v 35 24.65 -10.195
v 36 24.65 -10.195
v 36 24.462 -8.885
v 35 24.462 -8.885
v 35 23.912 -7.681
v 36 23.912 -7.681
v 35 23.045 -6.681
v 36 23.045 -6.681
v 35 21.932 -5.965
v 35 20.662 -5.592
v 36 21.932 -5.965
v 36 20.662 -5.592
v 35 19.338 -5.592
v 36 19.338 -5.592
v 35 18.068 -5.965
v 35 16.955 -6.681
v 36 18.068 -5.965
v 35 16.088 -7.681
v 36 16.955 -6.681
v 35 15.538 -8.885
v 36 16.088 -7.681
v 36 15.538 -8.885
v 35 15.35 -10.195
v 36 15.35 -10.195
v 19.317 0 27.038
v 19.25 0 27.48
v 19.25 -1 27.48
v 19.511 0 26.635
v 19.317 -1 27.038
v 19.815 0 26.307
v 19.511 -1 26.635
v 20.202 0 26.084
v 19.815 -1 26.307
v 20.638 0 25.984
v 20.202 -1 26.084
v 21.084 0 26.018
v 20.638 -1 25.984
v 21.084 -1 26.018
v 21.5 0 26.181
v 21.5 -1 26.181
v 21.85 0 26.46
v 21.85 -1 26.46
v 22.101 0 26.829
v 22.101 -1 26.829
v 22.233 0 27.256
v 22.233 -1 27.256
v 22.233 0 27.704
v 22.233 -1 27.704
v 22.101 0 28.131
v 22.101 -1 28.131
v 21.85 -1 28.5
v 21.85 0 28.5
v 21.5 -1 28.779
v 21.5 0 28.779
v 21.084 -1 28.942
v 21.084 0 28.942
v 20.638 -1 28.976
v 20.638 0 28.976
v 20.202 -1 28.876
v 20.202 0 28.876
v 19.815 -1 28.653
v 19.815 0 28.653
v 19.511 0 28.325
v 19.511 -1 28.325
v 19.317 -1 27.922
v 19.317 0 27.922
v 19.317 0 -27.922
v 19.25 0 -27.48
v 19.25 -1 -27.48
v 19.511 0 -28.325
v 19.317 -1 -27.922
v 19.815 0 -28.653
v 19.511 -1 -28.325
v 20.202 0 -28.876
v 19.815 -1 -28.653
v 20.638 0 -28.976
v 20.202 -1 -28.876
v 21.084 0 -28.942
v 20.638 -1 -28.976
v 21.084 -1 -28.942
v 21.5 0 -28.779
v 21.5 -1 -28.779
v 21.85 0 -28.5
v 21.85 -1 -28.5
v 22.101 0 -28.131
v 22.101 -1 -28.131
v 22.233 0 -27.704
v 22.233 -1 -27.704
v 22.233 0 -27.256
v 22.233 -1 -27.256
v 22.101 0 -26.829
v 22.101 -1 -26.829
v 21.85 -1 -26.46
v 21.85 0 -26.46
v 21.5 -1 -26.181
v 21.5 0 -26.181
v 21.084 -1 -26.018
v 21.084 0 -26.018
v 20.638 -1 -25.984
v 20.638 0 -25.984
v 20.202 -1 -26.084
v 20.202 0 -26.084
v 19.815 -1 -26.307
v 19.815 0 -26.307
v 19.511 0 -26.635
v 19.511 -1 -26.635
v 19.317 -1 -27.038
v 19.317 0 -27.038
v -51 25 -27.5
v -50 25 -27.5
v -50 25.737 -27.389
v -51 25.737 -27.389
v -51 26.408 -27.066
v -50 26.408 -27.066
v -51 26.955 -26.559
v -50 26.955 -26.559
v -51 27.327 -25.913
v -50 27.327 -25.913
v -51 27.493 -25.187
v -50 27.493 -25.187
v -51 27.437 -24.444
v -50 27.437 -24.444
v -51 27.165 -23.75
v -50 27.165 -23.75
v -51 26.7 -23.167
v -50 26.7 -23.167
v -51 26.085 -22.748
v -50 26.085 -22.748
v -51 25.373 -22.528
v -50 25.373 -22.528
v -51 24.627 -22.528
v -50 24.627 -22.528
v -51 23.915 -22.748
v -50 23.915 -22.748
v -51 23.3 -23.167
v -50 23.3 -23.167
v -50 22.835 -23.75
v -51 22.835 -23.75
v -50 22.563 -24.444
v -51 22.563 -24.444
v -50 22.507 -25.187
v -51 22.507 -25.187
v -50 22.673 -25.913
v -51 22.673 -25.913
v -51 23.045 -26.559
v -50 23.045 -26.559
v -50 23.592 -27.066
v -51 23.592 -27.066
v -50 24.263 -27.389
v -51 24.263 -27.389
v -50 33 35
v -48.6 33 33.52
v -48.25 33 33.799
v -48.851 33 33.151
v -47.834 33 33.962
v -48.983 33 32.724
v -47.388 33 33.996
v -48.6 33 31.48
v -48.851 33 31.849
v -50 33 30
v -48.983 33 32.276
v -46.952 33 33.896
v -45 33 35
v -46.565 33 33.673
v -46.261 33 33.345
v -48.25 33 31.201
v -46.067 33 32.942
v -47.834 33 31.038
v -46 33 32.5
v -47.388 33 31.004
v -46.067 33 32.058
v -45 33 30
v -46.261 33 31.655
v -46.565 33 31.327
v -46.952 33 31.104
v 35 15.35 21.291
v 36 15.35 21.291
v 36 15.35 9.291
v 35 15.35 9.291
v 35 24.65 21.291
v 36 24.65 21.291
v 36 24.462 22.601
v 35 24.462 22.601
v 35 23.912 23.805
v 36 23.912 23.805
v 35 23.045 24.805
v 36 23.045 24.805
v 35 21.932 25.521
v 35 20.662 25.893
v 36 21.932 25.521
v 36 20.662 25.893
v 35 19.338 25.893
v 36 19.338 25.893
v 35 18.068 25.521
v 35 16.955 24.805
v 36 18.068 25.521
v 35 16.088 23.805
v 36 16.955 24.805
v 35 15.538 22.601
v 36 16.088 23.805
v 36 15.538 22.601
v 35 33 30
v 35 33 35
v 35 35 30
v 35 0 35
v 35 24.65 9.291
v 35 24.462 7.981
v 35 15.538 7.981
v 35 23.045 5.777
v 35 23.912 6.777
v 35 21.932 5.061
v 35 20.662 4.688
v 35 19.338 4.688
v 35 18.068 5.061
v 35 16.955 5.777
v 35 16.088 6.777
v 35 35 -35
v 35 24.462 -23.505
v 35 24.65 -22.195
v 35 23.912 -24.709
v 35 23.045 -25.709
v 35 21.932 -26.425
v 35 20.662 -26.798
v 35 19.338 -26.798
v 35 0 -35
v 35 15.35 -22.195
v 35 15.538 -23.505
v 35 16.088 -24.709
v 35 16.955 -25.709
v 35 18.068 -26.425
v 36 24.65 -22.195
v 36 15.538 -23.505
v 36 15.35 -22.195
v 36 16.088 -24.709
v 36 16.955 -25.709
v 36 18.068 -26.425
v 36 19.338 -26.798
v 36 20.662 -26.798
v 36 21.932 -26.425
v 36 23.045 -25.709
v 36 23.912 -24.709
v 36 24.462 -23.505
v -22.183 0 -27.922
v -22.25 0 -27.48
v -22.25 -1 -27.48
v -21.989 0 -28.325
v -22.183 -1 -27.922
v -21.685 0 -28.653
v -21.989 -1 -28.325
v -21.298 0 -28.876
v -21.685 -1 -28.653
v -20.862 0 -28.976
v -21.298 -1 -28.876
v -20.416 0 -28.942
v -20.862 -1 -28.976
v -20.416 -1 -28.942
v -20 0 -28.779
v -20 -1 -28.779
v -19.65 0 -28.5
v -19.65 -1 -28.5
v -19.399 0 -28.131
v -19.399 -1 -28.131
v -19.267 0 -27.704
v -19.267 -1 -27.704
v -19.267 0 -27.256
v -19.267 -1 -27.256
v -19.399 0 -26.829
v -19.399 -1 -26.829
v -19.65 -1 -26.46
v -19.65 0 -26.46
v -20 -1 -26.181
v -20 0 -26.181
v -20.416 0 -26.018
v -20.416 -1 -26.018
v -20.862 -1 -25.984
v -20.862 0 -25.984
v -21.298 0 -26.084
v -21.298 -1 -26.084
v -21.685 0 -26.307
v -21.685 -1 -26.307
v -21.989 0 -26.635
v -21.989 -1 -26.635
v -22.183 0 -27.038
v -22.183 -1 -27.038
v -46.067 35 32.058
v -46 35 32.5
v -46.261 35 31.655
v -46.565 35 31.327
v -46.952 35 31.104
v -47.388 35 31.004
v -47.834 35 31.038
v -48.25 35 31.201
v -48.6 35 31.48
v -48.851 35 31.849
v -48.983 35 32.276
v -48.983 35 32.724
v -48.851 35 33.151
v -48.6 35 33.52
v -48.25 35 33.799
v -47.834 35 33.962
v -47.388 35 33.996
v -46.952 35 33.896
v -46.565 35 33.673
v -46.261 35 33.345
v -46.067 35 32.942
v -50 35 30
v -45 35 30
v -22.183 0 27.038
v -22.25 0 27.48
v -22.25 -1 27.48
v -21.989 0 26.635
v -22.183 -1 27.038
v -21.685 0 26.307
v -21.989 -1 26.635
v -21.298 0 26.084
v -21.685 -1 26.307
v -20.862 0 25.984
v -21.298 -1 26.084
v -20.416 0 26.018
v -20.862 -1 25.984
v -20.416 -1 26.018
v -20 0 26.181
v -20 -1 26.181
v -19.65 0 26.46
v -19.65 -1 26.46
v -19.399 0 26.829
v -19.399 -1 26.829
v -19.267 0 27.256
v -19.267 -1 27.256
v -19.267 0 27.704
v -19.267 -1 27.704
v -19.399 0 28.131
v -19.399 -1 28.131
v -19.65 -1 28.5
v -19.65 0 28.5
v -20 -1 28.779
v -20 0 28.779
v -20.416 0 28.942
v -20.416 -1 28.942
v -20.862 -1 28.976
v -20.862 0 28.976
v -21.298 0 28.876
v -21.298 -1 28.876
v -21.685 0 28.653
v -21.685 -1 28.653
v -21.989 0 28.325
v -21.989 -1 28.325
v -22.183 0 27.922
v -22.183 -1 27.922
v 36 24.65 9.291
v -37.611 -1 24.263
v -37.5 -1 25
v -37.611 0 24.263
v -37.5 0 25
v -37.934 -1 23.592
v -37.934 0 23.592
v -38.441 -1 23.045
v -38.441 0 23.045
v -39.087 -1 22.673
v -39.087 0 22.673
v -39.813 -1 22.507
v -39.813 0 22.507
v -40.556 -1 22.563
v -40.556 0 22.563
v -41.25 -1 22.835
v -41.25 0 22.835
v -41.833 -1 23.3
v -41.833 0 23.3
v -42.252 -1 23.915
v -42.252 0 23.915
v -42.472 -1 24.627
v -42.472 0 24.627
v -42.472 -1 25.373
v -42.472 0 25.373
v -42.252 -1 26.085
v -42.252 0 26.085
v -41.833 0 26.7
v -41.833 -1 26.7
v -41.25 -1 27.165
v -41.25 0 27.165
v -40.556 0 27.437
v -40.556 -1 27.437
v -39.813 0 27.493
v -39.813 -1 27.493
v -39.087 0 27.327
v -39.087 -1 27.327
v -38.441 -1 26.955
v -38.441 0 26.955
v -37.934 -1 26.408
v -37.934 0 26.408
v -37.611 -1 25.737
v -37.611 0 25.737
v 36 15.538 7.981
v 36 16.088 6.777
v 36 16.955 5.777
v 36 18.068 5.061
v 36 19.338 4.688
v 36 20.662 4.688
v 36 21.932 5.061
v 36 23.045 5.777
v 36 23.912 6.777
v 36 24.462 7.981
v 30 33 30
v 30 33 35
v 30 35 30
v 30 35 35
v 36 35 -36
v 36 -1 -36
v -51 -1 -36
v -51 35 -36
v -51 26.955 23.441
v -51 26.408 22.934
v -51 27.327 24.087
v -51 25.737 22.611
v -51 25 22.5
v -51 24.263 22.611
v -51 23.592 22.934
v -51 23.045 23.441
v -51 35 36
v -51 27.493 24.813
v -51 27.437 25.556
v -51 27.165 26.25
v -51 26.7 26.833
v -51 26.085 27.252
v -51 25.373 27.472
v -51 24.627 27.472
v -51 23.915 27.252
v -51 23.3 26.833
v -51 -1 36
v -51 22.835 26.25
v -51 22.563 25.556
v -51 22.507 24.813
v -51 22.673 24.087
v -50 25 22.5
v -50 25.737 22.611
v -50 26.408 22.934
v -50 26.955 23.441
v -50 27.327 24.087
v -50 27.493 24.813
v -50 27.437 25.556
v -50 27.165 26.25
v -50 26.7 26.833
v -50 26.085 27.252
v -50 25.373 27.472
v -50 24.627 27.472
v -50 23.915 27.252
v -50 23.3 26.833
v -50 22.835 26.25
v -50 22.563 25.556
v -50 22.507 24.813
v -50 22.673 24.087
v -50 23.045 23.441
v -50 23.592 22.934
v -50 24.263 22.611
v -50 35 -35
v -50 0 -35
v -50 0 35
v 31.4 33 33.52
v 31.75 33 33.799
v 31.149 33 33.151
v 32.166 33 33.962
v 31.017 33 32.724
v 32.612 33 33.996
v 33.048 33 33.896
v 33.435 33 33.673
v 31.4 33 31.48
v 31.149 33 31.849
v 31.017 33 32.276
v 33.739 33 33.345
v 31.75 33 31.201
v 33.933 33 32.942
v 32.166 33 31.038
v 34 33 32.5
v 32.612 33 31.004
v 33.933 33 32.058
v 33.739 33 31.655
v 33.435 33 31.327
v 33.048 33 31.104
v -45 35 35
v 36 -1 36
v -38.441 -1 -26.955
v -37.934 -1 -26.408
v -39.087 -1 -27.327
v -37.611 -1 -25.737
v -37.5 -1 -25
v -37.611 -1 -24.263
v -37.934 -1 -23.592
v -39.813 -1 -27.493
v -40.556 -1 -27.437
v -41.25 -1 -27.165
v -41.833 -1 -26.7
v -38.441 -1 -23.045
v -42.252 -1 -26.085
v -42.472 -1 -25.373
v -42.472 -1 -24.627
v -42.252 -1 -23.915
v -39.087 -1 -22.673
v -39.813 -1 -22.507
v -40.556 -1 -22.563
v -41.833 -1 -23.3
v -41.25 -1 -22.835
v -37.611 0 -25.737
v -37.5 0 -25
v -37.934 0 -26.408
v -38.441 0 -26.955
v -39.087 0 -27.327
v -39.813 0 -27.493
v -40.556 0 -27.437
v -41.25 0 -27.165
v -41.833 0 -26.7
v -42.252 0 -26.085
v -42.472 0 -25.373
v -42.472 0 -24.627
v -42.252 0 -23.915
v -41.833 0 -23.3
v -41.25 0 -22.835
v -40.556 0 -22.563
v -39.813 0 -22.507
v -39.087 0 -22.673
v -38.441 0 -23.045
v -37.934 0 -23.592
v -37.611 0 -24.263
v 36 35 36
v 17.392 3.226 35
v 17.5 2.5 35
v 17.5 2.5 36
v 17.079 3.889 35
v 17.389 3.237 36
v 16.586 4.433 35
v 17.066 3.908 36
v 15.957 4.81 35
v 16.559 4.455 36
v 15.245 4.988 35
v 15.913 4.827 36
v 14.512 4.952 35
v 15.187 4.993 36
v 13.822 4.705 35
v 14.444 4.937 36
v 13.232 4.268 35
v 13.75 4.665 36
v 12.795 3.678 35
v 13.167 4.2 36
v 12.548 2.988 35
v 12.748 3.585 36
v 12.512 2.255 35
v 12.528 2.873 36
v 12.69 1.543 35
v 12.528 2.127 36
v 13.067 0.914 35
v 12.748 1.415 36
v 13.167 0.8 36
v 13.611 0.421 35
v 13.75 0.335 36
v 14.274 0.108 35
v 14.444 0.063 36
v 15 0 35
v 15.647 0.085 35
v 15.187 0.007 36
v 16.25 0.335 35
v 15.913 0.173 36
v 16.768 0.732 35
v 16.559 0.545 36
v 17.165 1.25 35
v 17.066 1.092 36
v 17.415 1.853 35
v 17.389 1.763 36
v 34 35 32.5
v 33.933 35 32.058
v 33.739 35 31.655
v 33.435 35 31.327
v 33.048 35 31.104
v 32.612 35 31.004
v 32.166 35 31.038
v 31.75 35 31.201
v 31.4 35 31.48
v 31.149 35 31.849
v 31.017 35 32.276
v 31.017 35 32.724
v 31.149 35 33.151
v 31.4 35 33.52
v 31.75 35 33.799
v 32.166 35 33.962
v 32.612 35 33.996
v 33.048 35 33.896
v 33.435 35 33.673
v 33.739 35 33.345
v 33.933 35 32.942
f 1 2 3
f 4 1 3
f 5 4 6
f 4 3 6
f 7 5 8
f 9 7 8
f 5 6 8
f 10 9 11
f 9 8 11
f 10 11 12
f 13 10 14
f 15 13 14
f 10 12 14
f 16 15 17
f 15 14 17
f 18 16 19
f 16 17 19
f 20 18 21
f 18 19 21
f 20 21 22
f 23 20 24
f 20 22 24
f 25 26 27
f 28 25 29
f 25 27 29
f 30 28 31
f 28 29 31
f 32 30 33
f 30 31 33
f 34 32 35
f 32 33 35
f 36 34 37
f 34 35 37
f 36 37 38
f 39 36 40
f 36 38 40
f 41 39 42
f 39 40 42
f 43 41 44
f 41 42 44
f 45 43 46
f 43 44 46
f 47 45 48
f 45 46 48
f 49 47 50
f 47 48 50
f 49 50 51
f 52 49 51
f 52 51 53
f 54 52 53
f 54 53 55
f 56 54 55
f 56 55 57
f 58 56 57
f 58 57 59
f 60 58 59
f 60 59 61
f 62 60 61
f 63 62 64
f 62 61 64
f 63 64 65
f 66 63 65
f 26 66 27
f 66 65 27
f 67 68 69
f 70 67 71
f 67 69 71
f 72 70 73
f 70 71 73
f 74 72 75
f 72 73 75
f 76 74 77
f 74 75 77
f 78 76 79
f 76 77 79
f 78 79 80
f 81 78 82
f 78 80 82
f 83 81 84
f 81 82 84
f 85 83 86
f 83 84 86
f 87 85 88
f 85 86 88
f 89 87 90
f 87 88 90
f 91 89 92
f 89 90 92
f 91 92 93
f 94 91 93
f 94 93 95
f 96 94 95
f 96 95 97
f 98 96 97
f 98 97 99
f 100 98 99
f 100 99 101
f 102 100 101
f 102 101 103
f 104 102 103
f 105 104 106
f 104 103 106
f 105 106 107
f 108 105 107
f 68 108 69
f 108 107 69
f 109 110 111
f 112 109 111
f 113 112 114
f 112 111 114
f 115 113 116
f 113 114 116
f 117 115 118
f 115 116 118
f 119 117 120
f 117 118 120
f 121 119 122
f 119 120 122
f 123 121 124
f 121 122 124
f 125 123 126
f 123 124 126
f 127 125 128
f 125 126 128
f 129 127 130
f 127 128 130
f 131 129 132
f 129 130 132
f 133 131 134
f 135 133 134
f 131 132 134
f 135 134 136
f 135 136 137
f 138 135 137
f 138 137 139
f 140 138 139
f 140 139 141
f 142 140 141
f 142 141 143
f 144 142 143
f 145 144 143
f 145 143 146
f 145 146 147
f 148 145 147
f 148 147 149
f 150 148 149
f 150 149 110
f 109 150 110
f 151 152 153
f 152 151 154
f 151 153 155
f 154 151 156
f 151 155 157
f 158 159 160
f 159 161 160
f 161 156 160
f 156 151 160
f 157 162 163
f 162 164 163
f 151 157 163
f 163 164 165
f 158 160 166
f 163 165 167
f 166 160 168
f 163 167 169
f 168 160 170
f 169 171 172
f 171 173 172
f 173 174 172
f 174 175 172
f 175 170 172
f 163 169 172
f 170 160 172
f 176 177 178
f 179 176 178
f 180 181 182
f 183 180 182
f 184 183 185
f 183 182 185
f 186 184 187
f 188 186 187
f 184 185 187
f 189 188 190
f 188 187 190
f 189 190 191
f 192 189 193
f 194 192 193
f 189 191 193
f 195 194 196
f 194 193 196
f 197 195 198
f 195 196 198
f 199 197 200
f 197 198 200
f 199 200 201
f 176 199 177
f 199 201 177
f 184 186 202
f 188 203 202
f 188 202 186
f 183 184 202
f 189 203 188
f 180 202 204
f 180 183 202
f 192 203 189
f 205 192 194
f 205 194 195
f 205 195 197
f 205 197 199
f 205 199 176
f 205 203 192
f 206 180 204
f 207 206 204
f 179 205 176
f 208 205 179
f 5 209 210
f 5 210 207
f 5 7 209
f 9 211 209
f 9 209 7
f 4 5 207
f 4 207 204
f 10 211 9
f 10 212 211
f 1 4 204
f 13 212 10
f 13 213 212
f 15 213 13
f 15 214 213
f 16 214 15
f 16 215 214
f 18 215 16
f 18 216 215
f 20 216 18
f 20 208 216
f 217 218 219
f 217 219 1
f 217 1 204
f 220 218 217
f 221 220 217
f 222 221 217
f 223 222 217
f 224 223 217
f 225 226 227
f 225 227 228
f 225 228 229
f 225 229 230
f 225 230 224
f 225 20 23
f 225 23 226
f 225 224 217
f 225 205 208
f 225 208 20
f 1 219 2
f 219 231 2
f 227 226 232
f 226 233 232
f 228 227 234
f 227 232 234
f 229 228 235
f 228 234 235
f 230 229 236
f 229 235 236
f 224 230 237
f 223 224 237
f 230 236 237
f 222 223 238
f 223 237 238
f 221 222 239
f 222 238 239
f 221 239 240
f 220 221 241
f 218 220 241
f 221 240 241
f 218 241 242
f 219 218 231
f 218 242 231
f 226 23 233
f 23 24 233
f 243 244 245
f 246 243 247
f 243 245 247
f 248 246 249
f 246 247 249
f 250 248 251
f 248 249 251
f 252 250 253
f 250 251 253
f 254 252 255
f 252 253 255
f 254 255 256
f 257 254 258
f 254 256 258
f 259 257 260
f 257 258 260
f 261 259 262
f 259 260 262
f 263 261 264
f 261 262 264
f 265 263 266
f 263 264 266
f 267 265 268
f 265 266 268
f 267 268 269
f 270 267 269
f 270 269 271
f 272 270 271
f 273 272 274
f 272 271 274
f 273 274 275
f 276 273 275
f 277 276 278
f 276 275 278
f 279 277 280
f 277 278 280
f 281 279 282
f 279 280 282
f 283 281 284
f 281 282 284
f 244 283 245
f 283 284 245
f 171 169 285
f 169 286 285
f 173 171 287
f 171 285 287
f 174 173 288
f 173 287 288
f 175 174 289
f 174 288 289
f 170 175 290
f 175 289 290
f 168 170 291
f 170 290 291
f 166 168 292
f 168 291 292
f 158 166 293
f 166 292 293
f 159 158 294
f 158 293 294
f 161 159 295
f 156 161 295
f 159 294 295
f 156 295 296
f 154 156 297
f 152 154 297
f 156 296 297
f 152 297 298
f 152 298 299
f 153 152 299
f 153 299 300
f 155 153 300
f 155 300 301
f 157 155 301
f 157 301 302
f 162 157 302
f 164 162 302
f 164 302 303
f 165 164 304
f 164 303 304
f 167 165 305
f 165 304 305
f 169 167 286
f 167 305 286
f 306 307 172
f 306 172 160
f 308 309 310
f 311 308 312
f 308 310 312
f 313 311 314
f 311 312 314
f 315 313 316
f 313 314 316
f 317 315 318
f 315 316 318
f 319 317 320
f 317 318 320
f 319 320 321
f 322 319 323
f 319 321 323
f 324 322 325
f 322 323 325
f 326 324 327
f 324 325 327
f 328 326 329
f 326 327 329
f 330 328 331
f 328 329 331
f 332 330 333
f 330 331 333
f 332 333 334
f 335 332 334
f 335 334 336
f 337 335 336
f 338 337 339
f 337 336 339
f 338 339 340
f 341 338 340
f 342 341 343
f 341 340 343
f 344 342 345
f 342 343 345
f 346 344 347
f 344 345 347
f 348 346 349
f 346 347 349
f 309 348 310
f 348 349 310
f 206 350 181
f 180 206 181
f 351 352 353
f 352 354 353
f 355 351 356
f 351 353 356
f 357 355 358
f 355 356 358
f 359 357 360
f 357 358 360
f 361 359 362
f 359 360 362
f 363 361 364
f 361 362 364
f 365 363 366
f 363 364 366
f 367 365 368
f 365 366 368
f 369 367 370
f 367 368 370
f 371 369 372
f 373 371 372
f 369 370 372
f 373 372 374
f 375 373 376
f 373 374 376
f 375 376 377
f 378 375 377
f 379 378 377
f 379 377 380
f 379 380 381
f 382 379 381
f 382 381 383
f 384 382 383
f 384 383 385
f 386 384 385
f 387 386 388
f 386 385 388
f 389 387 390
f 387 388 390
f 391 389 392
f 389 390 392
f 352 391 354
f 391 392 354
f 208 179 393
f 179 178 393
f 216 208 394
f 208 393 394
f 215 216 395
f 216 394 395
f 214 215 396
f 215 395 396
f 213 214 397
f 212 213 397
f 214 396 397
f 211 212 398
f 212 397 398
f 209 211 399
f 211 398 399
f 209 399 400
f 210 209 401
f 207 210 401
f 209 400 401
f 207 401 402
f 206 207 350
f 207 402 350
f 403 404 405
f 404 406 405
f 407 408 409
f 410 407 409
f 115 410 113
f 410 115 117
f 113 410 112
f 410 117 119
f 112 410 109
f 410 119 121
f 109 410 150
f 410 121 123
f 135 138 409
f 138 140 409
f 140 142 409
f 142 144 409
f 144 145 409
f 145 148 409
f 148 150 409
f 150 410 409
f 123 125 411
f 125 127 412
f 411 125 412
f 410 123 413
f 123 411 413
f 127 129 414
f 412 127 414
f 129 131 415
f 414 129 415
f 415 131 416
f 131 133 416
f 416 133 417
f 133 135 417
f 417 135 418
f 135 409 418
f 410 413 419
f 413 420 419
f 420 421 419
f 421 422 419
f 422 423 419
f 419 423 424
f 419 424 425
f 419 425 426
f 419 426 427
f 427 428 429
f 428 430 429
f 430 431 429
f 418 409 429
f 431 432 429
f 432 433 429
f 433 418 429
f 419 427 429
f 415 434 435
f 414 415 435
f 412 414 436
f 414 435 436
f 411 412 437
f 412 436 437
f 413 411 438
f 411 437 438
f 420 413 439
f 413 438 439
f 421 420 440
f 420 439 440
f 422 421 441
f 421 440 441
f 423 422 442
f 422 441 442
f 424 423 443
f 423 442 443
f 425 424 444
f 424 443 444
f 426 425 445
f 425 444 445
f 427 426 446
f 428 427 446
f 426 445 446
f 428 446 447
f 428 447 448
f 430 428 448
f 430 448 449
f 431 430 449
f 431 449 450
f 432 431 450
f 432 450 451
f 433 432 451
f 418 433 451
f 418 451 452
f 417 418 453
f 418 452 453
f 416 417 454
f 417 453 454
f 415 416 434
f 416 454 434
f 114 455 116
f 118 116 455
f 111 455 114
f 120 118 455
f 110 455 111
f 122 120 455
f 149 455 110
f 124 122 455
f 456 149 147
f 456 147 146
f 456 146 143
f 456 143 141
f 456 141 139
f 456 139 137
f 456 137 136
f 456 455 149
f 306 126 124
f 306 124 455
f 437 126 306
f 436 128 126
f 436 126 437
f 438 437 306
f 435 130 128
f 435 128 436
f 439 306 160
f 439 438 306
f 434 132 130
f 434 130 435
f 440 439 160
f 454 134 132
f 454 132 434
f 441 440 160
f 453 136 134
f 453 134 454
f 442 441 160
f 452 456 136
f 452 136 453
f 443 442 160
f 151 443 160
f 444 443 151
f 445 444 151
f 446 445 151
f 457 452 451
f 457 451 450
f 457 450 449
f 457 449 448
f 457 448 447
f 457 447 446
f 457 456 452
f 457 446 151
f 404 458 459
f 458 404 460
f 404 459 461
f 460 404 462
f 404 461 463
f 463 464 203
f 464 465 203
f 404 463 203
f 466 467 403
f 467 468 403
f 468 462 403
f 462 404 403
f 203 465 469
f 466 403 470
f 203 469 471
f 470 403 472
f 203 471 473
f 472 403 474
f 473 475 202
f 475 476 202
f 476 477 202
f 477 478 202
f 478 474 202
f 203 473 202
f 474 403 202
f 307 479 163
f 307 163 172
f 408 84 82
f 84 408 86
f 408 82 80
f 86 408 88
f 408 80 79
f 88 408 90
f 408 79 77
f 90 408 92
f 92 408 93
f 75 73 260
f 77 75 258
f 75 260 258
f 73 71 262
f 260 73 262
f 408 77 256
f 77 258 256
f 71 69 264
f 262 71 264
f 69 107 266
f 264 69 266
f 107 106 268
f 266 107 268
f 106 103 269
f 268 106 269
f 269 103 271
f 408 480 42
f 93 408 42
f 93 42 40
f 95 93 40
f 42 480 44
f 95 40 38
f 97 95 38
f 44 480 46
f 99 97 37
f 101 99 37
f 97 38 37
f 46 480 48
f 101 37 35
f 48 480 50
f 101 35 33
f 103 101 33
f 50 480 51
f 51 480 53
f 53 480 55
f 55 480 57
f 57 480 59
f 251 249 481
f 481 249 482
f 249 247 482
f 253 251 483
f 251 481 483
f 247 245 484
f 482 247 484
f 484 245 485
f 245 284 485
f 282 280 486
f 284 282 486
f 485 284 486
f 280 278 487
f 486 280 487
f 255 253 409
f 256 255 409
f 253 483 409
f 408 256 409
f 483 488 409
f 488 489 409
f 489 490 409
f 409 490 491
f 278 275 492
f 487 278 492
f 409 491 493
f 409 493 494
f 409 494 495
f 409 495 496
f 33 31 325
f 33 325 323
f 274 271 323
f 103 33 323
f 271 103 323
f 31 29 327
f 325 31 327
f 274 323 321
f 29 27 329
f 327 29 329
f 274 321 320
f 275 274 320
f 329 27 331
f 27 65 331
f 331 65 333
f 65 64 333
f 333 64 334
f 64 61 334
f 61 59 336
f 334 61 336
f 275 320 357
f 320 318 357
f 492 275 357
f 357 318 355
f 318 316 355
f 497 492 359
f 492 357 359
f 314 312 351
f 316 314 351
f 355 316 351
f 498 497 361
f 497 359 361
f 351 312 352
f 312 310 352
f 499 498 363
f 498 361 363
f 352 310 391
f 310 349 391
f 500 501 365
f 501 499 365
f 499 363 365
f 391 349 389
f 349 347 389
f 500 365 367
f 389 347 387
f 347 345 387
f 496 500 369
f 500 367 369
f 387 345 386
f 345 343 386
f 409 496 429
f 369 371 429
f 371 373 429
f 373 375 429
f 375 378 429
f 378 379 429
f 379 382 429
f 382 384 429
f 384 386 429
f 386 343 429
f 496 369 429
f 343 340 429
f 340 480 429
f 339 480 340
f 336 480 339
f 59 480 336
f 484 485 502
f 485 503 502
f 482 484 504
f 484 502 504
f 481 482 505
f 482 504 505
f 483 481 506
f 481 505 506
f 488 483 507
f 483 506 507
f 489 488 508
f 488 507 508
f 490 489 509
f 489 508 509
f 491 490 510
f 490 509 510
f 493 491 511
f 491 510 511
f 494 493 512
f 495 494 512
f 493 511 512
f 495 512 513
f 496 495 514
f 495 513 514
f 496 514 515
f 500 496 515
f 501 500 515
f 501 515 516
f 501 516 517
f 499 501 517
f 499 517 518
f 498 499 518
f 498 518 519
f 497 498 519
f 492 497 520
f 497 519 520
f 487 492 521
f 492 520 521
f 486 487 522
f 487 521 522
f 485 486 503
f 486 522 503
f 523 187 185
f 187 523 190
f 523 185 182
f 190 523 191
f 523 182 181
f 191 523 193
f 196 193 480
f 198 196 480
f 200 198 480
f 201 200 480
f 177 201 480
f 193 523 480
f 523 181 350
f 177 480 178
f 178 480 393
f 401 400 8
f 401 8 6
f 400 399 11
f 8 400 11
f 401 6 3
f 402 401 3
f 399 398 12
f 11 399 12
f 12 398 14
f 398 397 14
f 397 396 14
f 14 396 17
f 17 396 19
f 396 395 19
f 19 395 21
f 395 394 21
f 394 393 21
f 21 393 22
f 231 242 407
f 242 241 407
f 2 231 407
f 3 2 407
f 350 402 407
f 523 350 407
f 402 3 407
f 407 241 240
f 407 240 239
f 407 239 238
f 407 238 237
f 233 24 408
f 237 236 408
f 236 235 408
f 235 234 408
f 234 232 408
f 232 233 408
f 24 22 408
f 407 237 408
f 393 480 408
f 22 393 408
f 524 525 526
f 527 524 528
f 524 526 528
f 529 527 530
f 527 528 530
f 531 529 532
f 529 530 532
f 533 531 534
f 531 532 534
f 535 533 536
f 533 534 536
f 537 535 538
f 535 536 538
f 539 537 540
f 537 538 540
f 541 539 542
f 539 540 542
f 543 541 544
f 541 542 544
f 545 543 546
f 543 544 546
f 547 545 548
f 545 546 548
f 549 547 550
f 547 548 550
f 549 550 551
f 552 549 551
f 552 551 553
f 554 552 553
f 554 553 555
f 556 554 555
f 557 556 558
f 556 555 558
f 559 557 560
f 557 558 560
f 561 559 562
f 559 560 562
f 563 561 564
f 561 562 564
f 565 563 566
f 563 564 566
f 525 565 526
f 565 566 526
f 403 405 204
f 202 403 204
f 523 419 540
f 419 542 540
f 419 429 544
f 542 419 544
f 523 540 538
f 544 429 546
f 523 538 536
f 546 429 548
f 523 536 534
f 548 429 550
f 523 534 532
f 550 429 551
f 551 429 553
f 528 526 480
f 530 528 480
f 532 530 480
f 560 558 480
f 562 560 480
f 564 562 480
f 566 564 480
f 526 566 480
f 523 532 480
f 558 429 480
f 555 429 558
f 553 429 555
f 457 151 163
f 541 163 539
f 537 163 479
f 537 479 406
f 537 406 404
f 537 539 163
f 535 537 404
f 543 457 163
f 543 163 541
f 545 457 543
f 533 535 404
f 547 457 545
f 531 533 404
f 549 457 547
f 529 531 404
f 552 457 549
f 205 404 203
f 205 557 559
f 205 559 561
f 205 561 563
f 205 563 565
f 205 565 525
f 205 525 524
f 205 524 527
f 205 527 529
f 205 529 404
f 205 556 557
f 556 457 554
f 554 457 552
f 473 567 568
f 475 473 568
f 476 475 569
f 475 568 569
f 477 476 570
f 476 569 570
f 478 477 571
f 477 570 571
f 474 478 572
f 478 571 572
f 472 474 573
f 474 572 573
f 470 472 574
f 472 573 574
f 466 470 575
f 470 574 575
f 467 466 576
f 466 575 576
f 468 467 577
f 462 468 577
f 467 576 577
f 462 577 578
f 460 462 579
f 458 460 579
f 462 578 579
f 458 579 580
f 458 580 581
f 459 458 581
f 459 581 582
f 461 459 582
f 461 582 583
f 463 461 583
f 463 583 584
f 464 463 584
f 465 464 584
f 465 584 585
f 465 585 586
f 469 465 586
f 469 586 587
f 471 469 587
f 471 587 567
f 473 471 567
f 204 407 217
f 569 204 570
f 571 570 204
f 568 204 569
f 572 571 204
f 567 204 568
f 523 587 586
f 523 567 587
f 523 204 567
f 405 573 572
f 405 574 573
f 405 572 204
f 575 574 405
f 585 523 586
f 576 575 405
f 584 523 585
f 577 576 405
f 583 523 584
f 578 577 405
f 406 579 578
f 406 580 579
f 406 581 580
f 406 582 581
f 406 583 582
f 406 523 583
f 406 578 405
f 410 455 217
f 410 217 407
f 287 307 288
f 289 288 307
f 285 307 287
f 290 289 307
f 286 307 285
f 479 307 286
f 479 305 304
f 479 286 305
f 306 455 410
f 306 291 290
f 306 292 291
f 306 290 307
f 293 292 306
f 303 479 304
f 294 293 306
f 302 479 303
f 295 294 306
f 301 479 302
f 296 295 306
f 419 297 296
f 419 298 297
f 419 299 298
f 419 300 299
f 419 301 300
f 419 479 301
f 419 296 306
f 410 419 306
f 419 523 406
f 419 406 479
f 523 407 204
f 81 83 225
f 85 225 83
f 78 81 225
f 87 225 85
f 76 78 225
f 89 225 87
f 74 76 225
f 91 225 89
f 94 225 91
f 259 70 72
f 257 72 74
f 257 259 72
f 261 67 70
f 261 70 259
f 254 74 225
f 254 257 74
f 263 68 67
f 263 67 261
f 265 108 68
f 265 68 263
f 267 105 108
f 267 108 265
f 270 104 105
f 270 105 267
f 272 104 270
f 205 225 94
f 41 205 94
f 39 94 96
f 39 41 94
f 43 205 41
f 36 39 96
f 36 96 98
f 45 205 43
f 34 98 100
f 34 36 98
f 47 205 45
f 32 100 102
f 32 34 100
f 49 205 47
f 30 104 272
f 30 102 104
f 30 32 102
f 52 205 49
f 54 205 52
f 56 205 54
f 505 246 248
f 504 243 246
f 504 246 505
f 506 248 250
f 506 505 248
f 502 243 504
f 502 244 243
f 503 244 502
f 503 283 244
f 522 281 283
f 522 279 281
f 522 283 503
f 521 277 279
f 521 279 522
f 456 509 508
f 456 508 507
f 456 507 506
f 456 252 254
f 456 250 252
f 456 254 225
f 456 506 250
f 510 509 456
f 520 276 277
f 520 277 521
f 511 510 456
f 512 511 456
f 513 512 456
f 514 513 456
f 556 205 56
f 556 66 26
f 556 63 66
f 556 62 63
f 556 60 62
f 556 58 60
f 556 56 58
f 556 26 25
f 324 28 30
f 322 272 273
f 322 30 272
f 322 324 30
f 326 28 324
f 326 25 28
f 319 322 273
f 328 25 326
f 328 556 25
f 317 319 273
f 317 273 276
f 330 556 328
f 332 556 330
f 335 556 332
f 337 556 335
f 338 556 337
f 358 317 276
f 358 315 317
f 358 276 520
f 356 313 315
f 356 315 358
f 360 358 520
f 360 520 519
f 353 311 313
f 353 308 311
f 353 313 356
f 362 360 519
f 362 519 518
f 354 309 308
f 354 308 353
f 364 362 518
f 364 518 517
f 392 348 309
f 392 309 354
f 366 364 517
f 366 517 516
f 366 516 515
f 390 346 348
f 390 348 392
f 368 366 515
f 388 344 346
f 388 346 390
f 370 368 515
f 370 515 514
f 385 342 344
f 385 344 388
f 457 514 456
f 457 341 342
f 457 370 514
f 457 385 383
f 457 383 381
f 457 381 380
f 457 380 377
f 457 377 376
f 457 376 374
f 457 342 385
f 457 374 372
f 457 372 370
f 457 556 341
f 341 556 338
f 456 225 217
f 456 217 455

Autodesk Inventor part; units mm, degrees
ref_plane "YZ Plane" through (0, 0, 0) normal (1, 0, 0) x (0, 1, 0)
ref_plane "XZ Plane" through (0, 0, 0) normal (0, 1, 0) x (-1, 0, 0)
ref_plane "XY Plane" through (0, 0, 0) normal (0, 0, 1) x (1, 0, 0)
sketch "Esboço1" plane through (0, 0, 0) normal (0, 1, 0) x (-1, 0, 0)
  line L0 (-23.75, -30.48) -> (23.75, -30.48)
  line L1 (23.75, -30.48) -> (23.75, 30.48)
  line L2 (23.75, 30.48) -> (-23.75, 30.48)
  line L3 (-23.75, 30.48) -> (-23.75, -30.48)
  line L4 (-23.75, -30.48) -> (23.75, 30.48) construction
  line L5 (23.75, -30.48) -> (-23.75, 30.48) construction
  line L6 (-35, -35) -> (35, -35)
  line L7 (35, 35) -> (-35, 35)
  line L8 (-35, 35) -> (-35, -35)
  line L9 (-35, -35) -> (35, 35) construction
  line L10 (35, -35) -> (-35, 35) construction
  line L11 (23.75, 30.48) -> (20.75, 30.48)
  line L12 (23.75, 27.48) -> (23.75, 30.48)
  line L13 (-23.75, 30.48) -> (-20.75, 30.48)
  line L14 (-23.75, 27.48) -> (-23.75, 30.48)
  line L15 (-23.75, -30.48) -> (-20.75, -30.48)
  line L16 (-23.75, -27.48) -> (-23.75, -30.48)
  line L17 (23.75, -30.48) -> (20.75, -30.48)
  line L18 (23.75, -27.48) -> (23.75, -30.48)
  circle A0 centre (20.75, 27.48) radius 1.5
  circle A1 centre (-20.75, 27.48) radius 1.5
  circle A2 centre (-20.75, -27.48) radius 1.5
  circle A3 centre (20.75, -27.48) radius 1.5
  line L19 (35, -35) -> (50, -35)
  line L20 (50, -35) -> (50, 35)
  line L21 (50, 35) -> (35, 35)
  line L22 (50, -35) -> (40, -35)
  line L23 (40, -25) -> (40, 25)
  circle A4 centre (40, -25) radius 2.5
  circle A5 centre (40, 25) radius 2.5
  point P0 (0, 0)
  dimension "d0" = 47.5
  dimension "d1" = 60.96
  dimension "d12" = 3
  dimension "d13" = 3
  dimension "d33" = 15
  dimension "d34" = 70
  dimension "d35" = 10
  dimension "d36" = 10
  dimension "d37" = 50
  dimension "d38" = 5
  dimension "d39" = 5
extrude "Extrusão1" add sketch "Esboço1" along normal blind 35 contours L3 L2 L1 L0 | L8 L7 L21 L20 L19 L6 | A4 | A5
shell "Casca1" thickness 1 outward yes removed faces 5 at (6.6326, 35, -8.7485) at (19.2549, 23.3333, 27.3593) at (-22.2451, 23.3333, -27.6007) at (-22.2451, 23.3333, 27.3593) at (19.2549, 23.3333, -27.6007)
sketch "Esboço3" plane through (-50, 0, -35) normal (0, 1, 0) x (1, 0, 0)
  line L0 (0, 0) -> (85, 0) projected
  line L1 (0, 0) -> (10, 0)
  line L2 (10, 0) -> (10, -10)
  line L3 (10, -10) -> (10, -60)
  circle A0 centre (10, -10) radius 2.5
  circle A1 centre (10, -60) radius 2.5
  point P0 (50, -35)
  dimension "d40" = 10
  dimension "d41" = 10
  dimension "d42" = 50
  dimension "d43" = 5
  dimension "d44" = 5
extrude "Extrusão3" cut sketch "Esboço3" against normal blind 1
sketch "Esboço4" plane through (-50, 0, -35) normal (1, 0, 0) x (0, 0, -1)
  line L0 (-70, 0) -> (-70, 35) projected
  line L1 (-70, 35) -> (-60, 35)
  line L2 (-70, 35) -> (0, 35) projected
  line L3 (-60, 35) -> (-60, 25)
  line L4 (0, 0) -> (0, 35) projected
  line L5 (0, 35) -> (-10, 35)
  line L6 (-10, 35) -> (-10, 25)
  circle A0 centre (-60, 25) radius 2.5
  circle A1 centre (-10, 25) radius 2.5
  point P0 (-35, 0)
  dimension "d47" = 10
  dimension "d48" = 10
  dimension "d49" = 10
  dimension "d50" = 10
  dimension "d51" = 5
  dimension "d52" = 5
extrude "Extrusão4" cut sketch "Esboço4" against normal blind 1
sketch "Esboço5" plane through (0, 35, 0) normal (0, 1, 0) x (1, 0, 0)
  line L0 (-50, -35) -> (35, -35) projected
  line L1 (35, -35) -> (30, -35)
  line L2 (30, -35) -> (30, -30)
  line L3 (30, -30) -> (35, -30)
  line L4 (35, -30) -> (35, -35)
  line L5 (-50, -35) -> (-45, -35)
  line L6 (-45, -35) -> (-45, -30)
  line L7 (-45, -30) -> (-50, -30)
  line L8 (-50, -30) -> (-50, -35)
  circle A0 centre (-47.5, -32.5) radius 1.5
  circle A1 centre (32.5, -32.5) radius 1.5
  point P0 (0, 0)
  dimension "d63" = 5
  dimension "d64" = 5
  dimension "d65" = 5
  dimension "d66" = 5
  dimension "d67" = 3
  dimension "d68" = 3
extrude "Extrusão5" add sketch "Esboço5" against normal blind 2
thread "Rosca1" size "M5x0.8" class "6H" standard "ANSI Metric M Profile" full length
thread "Rosca2" size "M5x0.8" class "6H" standard "ANSI Metric M Profile" full length
thread "Rosca3" size "M5x0.8" class "6H" standard "ANSI Metric M Profile" full length
thread "Rosca4" size "M5x0.8" class "6H" standard "ANSI Metric M Profile" full length
sketch "Esboço9" plane through (-51, -1, 36) normal (0, 0, 1) x (1, 0, 0)
  line L0 (86, 1) -> (1, 1) projected
  line L1 (86, 1) -> (66, 1)
  line L2 (66, 1) -> (66, 3.5)
  circle A0 centre (66, 3.5) radius 2.5
  point P0 (51, 1)
  dimension "d101" = 20
  dimension "d102" = 2.5
extrude "Extrusão9" cut sketch "Esboço9" against normal blind 2
sketch "Esboço10" plane through (36, -1, 36) normal (1, 0, 0) x (0, 0, -1)
  line L0 (1, 34) -> (1, 36) projected
  line L1 (1, 36) -> (1, 21)
  line L2 (1, 1) -> (1, 34) projected
  line L3 (71, 1) -> (71, 36) projected
  circle A0 centre (26.7092, 21) radius 4.65
  line L4 (26.7092, 25.65) -> (14.7092, 25.65)
  circle A1 centre (14.7092, 21) radius 4.65
  line L5 (14.7092, 16.35) -> (26.7092, 16.35)
  circle A2 centre (58.195, 21) radius 4.65
  line L6 (58.195, 25.65) -> (46.195, 25.65)
  circle A3 centre (46.195, 21) radius 4.65
  line L7 (46.195, 16.35) -> (58.195, 16.35)
  line L8 (1, 21) -> (71, 21)
  line L9 (34.7126, 21) -> (44.7126, 21)
  point P0 (36, 1)
  dimension "d105" = 15
  dimension "d107" = 9.3
  dimension "d108" = 12
  dimension "d109" = 9.3
  dimension "d110" = 12
  dimension "d111" = 10
extrude "Extrusão10" cut sketch "Esboço10" against normal blind 2
sketch "Esboço11" plane through (-51, -1, 36) normal (0, 0, 1) x (1, 0, 0)
  circle A0 centre (66, 3.5) radius 2.5 projected
properties part number "Caixa de Segurança_Sem fixação"
